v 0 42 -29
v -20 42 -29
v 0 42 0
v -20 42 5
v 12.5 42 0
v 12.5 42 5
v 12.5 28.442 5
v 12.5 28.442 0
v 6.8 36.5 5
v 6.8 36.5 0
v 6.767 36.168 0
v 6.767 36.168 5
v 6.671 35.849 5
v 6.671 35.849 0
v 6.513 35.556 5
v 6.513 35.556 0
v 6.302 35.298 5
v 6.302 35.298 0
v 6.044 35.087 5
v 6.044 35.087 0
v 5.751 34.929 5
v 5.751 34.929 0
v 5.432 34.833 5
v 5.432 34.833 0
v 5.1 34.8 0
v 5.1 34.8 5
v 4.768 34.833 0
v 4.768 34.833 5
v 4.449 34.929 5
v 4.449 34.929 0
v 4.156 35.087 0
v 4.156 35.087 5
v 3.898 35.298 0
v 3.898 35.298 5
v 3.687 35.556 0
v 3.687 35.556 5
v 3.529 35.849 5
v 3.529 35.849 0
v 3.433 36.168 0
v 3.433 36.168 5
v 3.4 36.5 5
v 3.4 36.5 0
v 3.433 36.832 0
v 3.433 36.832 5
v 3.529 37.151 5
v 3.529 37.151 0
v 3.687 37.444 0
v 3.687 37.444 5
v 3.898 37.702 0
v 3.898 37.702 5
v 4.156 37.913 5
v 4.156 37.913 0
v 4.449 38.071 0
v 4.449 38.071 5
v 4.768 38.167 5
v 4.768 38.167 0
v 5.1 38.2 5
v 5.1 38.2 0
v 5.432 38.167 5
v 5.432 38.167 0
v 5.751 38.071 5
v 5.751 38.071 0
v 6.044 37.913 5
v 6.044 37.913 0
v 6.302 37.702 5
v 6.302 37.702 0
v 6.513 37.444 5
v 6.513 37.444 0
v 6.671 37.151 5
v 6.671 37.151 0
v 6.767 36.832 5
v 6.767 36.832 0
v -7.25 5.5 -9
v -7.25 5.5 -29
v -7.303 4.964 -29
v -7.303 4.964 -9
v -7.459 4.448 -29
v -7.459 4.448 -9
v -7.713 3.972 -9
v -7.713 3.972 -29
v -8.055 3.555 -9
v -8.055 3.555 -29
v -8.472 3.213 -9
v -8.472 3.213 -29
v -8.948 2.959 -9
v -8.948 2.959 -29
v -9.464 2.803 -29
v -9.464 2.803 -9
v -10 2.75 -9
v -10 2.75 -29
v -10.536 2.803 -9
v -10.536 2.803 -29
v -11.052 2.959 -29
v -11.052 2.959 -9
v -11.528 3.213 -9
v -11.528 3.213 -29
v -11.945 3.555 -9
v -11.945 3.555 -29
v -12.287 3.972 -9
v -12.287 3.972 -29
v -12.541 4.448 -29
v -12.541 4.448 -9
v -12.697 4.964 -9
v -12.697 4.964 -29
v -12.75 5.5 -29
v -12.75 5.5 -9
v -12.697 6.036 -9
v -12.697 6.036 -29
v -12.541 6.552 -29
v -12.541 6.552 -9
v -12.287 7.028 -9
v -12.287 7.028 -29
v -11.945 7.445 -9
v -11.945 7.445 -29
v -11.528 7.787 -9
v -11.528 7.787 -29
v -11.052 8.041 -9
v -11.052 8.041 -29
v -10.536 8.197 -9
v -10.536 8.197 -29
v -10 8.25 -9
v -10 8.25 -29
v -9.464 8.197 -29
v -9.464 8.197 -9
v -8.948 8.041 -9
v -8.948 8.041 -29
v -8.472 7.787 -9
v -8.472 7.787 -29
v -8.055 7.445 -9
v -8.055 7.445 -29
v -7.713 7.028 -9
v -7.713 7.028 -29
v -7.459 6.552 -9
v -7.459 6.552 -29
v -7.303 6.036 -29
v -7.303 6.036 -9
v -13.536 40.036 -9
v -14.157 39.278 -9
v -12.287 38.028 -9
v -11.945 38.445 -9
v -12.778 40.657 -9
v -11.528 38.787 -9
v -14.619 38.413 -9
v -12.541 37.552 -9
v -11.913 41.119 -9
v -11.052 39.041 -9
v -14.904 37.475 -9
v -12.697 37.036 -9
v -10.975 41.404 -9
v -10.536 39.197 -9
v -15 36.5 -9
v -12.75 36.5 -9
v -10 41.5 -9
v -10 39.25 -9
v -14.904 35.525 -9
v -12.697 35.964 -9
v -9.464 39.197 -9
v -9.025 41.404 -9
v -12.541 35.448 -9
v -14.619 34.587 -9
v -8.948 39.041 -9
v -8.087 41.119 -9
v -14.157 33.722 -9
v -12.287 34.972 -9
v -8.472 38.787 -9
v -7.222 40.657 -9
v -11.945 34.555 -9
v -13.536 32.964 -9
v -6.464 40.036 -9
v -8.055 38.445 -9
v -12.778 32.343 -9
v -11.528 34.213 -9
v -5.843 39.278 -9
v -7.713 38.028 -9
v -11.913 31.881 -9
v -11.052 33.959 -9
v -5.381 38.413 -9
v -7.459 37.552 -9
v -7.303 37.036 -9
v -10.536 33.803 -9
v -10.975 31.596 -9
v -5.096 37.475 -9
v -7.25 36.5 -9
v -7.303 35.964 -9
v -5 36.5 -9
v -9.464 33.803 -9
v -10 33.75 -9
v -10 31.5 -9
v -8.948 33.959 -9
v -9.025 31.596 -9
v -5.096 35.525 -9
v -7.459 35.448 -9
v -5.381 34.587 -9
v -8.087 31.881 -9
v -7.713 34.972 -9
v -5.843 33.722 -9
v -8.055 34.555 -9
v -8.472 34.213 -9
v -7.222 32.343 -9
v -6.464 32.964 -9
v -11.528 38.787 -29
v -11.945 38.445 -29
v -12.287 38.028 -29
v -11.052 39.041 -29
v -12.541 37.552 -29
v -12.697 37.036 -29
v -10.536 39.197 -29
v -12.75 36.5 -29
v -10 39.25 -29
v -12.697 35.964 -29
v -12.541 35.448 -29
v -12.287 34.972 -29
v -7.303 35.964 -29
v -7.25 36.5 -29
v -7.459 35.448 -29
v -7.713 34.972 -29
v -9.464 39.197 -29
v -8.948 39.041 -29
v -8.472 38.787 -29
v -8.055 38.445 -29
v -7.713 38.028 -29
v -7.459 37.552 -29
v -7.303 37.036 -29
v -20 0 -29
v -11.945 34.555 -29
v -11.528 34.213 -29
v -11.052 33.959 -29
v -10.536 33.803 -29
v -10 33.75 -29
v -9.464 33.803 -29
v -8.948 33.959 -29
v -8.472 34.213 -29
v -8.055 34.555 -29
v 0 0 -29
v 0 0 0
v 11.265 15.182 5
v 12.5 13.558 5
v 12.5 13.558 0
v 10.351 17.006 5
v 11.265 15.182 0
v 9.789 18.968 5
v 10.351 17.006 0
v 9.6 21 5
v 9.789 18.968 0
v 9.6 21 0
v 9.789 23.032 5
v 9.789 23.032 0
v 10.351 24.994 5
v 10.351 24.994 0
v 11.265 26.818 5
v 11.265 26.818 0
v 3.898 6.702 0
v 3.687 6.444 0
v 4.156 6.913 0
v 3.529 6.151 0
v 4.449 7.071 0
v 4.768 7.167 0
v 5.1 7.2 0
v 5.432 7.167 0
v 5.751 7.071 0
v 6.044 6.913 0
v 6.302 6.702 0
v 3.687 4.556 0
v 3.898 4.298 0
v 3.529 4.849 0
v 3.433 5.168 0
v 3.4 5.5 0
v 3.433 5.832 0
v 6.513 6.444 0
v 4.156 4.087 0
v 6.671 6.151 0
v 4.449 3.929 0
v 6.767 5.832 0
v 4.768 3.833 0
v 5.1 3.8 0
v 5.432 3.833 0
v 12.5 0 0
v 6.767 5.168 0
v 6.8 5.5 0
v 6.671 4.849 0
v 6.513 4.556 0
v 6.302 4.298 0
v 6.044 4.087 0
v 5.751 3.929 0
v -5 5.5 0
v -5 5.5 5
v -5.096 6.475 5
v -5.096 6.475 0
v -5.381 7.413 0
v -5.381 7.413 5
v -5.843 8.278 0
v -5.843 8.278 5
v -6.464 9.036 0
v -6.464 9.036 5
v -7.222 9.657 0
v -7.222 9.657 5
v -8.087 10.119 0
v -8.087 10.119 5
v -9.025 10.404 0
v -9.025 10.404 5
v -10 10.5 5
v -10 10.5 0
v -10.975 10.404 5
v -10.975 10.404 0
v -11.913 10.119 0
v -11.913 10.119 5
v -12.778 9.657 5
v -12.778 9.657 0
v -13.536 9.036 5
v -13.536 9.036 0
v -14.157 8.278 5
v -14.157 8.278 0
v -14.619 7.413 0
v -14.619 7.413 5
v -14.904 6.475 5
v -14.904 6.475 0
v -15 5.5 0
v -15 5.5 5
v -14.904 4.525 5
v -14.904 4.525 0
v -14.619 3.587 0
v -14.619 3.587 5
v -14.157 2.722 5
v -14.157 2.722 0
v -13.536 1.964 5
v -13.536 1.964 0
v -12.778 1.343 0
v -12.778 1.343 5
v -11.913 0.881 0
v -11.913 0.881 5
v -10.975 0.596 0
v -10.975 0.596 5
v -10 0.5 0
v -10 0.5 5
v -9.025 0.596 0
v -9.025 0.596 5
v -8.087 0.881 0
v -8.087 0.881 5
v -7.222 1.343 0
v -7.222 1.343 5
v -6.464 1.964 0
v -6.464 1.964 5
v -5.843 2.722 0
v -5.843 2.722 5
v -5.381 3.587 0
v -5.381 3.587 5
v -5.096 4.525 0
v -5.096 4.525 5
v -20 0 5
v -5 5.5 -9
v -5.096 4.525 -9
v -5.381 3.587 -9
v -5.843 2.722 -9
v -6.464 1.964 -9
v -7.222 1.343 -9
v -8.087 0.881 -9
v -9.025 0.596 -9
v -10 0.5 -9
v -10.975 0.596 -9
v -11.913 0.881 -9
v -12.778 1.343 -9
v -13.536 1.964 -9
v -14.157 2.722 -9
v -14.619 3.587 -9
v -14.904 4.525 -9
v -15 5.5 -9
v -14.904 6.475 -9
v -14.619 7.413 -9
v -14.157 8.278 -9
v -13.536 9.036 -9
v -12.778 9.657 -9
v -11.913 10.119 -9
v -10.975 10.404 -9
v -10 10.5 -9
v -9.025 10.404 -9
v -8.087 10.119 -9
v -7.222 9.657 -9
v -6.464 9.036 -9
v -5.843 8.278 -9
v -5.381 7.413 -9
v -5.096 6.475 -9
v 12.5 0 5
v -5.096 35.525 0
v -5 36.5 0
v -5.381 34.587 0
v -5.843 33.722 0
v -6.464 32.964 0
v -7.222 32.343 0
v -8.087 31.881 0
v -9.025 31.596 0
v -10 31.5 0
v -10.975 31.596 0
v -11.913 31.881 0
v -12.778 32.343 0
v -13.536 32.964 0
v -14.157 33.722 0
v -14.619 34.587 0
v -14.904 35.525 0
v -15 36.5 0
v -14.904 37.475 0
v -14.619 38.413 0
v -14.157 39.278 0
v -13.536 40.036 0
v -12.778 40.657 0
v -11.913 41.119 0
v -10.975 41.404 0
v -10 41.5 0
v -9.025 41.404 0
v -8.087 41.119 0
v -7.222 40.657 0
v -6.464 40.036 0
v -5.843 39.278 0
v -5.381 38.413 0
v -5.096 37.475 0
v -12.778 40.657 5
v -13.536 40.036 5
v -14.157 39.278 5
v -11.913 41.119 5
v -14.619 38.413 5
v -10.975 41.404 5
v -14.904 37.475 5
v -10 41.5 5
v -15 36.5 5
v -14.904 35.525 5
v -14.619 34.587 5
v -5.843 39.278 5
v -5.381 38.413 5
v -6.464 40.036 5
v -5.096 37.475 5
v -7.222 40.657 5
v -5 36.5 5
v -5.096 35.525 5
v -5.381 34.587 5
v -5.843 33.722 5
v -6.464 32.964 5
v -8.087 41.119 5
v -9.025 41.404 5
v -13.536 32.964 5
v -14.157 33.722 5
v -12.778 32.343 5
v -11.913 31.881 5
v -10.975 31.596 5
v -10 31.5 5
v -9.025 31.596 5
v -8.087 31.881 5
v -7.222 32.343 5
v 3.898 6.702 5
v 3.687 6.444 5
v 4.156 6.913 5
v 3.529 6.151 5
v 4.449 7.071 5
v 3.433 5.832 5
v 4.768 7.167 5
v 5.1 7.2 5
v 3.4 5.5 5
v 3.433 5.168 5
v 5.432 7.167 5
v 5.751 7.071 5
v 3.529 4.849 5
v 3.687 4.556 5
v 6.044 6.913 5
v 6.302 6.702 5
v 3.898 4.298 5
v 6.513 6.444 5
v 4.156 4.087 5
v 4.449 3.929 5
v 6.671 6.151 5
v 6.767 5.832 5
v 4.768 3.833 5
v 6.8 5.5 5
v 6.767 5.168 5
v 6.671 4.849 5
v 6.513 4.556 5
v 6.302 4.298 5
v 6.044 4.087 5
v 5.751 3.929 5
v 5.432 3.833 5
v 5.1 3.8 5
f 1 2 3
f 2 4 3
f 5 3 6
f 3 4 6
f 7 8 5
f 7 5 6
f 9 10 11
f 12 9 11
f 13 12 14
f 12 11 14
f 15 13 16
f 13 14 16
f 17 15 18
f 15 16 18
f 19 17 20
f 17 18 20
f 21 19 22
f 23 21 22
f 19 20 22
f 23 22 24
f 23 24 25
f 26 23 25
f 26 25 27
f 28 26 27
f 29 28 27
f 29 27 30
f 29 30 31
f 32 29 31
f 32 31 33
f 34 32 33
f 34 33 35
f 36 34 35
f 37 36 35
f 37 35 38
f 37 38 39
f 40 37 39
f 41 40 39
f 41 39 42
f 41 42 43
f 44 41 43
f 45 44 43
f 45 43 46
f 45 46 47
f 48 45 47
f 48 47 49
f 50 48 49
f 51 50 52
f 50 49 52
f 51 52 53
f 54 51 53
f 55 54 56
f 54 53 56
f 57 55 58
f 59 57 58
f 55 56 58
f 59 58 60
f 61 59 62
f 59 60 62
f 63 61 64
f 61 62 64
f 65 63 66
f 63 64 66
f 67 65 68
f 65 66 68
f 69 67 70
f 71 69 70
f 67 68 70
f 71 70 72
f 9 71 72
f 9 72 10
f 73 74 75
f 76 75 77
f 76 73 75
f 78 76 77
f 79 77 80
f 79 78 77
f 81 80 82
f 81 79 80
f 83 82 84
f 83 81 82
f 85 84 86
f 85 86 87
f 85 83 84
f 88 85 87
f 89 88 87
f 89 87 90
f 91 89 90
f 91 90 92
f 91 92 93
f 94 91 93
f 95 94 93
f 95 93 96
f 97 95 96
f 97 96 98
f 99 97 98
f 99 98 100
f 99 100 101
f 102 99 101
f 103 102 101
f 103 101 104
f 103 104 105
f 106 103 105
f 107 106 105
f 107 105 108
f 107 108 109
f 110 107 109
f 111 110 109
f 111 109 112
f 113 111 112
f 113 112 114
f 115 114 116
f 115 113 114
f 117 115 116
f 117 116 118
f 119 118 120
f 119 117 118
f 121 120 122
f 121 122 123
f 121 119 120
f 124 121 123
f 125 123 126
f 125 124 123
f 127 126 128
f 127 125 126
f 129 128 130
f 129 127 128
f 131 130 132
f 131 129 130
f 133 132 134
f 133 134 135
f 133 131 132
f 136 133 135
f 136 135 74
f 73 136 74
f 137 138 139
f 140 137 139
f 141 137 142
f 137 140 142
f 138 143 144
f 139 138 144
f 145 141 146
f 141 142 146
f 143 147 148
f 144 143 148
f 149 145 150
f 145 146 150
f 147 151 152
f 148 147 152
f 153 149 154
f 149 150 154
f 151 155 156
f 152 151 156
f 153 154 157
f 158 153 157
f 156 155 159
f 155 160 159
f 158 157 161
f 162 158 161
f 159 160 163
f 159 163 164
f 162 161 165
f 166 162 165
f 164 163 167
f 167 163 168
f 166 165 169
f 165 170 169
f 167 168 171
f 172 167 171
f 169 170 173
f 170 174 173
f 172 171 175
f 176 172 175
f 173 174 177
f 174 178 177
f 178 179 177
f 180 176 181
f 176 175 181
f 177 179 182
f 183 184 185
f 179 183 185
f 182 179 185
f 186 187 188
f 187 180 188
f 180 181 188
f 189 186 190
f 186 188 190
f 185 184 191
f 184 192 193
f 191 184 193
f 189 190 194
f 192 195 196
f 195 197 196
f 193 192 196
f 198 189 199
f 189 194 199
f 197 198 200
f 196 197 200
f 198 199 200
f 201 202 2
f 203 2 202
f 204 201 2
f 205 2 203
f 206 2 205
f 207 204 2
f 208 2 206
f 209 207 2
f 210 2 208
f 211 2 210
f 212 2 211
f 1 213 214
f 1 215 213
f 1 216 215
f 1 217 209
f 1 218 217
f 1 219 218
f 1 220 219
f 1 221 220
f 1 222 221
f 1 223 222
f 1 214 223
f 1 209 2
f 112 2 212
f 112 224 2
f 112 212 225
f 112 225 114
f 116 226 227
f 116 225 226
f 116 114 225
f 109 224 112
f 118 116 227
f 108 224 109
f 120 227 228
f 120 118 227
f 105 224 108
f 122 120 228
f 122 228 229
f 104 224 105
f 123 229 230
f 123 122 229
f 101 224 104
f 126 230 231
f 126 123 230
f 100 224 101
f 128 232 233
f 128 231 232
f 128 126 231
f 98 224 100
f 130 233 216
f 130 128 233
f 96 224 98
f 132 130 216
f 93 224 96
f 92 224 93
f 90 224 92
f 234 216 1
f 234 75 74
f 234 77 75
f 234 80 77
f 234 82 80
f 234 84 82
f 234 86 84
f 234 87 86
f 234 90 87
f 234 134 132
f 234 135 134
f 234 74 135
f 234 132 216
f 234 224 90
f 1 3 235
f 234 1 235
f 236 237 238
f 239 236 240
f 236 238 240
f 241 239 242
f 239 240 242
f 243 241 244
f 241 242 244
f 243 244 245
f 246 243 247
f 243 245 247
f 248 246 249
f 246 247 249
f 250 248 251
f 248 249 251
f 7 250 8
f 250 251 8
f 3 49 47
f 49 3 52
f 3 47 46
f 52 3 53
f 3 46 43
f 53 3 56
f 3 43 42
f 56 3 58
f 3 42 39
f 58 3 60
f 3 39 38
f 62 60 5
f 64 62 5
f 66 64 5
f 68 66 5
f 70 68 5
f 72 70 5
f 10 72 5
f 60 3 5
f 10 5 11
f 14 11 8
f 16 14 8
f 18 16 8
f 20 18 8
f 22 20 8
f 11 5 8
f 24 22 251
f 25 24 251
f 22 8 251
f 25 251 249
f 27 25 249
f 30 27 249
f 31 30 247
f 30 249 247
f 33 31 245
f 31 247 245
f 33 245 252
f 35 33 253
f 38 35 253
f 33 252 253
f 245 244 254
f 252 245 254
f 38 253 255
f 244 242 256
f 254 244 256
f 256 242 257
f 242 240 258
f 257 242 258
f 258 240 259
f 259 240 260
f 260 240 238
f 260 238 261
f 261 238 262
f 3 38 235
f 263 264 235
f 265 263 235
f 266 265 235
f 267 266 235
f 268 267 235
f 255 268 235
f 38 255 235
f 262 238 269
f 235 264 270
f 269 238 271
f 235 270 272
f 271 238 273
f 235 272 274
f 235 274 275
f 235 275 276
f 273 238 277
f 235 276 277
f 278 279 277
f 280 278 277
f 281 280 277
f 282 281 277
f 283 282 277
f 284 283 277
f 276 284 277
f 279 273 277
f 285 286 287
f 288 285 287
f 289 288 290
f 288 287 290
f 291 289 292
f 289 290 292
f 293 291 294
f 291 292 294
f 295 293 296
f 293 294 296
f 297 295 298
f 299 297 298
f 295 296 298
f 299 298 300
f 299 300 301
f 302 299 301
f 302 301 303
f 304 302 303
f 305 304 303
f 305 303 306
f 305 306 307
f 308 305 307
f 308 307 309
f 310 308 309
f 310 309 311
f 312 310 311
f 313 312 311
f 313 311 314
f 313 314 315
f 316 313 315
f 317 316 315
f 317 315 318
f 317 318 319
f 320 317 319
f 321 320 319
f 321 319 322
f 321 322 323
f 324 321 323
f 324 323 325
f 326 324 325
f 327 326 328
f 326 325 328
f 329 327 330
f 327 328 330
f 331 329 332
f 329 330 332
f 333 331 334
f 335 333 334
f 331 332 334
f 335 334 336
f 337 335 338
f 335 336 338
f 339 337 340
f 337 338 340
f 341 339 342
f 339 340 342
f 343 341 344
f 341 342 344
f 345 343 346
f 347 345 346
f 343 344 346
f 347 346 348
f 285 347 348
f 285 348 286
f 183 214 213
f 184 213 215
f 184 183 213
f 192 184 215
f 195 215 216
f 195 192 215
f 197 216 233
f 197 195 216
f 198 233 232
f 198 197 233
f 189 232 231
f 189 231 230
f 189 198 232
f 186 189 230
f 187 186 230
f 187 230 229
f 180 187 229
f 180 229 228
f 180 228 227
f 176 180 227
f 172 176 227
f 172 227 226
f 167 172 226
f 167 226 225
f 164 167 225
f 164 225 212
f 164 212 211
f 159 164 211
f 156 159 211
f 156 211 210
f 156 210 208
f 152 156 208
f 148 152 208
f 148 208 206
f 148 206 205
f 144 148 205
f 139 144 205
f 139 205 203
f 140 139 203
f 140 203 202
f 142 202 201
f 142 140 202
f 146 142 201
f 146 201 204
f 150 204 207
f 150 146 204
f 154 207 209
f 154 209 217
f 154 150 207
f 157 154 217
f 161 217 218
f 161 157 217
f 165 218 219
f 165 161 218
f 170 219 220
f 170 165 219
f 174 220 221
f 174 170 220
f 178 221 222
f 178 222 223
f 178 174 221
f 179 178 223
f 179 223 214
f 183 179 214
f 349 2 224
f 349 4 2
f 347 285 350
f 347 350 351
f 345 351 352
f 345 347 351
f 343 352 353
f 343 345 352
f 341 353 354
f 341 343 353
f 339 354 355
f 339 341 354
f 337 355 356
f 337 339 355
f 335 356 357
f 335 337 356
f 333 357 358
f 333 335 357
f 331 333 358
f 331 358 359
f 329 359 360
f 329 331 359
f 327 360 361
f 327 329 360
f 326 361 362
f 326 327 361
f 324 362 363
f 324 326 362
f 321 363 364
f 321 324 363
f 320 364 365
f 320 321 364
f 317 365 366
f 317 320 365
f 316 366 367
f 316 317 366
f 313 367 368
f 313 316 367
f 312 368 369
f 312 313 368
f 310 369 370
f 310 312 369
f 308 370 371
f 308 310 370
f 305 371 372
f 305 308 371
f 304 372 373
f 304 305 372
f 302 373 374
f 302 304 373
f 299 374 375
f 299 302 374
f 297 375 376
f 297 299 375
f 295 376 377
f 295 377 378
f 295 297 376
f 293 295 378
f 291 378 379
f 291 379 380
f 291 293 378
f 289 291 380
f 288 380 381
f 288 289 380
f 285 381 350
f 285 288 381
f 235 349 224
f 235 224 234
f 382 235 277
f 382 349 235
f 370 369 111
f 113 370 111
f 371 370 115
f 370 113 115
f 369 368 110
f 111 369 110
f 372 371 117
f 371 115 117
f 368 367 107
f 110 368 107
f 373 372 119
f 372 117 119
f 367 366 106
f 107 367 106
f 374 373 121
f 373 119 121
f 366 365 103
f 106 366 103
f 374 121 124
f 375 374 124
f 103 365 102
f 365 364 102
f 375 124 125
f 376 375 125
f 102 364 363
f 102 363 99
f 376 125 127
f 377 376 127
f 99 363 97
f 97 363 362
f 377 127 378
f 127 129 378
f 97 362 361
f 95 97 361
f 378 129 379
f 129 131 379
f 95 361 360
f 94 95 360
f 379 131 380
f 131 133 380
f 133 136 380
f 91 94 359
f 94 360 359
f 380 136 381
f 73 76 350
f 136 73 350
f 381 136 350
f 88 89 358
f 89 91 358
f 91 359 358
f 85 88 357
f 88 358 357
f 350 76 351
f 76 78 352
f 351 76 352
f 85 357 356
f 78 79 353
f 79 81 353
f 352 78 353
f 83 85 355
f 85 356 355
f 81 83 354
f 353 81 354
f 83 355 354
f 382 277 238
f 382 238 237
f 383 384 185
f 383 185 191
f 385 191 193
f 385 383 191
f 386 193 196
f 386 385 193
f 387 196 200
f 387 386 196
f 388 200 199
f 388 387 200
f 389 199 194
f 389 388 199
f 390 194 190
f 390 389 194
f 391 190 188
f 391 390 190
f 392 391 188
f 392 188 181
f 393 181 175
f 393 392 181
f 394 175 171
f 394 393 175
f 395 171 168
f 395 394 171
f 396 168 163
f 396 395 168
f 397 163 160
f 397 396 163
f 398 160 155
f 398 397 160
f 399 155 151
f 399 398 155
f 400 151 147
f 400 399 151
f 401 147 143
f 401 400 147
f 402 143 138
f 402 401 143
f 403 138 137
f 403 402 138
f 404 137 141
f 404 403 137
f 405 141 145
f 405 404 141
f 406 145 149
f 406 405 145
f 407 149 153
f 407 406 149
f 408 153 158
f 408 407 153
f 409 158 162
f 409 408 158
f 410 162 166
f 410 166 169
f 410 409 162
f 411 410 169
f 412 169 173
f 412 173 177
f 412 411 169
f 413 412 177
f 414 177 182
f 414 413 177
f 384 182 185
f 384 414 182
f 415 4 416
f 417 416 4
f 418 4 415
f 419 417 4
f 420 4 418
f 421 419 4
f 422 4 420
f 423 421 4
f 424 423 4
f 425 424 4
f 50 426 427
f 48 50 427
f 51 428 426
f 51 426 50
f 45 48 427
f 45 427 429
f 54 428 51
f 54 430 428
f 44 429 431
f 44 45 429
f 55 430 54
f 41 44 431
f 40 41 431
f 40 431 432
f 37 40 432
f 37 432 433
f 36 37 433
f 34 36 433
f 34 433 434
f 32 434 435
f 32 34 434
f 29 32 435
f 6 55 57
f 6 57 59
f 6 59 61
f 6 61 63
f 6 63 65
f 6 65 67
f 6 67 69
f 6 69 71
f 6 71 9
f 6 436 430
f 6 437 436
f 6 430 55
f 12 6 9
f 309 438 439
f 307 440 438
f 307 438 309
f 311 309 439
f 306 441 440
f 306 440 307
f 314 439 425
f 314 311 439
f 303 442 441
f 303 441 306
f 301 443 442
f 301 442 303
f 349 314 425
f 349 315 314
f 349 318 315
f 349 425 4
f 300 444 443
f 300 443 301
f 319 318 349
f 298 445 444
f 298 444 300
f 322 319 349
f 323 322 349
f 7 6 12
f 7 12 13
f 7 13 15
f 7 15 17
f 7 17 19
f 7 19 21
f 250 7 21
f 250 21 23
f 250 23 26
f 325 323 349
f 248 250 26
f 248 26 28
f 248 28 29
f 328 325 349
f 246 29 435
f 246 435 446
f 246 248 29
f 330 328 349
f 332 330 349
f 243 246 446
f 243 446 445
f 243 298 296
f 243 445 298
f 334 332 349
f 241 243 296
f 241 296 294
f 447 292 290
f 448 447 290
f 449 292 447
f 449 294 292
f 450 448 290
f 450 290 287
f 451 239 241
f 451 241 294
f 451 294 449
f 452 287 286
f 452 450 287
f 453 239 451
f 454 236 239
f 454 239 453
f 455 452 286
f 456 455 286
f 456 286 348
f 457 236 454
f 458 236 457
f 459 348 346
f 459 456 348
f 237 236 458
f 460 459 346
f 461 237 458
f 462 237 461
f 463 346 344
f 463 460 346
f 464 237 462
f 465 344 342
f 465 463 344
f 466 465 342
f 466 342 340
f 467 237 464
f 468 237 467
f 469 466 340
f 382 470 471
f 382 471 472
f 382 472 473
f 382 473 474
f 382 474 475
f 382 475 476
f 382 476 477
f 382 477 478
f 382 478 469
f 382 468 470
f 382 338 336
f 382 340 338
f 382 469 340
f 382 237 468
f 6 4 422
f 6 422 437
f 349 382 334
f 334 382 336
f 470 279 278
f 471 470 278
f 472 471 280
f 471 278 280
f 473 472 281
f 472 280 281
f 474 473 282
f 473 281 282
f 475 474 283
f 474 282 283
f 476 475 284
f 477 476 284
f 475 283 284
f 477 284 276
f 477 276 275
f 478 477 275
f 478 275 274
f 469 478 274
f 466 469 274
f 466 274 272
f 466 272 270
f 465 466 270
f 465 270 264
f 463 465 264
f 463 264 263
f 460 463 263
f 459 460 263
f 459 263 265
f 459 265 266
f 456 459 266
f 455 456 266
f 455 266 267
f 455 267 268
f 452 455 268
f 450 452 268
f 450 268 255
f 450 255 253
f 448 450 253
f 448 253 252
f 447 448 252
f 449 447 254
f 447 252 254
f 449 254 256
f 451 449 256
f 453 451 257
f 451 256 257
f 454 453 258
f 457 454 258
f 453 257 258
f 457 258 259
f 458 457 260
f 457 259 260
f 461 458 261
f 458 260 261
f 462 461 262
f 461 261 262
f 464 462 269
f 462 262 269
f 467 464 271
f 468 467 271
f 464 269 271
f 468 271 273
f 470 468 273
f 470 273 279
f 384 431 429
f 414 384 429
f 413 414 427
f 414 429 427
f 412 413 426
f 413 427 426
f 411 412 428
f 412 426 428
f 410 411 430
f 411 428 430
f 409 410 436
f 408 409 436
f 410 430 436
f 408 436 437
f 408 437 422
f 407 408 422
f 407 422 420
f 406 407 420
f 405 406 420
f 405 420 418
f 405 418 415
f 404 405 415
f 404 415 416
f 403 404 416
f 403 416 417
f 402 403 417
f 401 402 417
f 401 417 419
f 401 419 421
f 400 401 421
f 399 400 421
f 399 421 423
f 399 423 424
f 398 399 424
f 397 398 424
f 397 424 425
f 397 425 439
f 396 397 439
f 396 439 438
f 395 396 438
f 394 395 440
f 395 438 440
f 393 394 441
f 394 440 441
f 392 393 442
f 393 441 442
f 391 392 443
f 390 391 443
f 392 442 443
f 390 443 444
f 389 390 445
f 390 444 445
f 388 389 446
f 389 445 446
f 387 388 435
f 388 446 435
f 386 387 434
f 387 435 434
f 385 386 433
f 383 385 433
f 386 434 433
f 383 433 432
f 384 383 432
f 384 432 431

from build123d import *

# Parameters (mm, degrees)
F1_DEPTH  = 42
F2_R      = 1.7
F2_R_2    = 11
F3_DEPTH  = 5.001
F4_W      = 42
F4_H      = 5
F5_DEPTH  = 20
F6_R      = 5
F6_R_2    = 2.75
F7_DEPTH  = 19
F8_W      = 20
F8_H      = 42
F8_R      = 5
F8_R_2    = 2.75
F9_DEPTH  = 29
F10_DEPTH = 9


with BuildPart() as f1:
    # F0 (on Front) → F1 (new body)
    with BuildSketch(Plane.XZ):
        Polygon((12.5, 5), (8.5, 5), (0, 5), (0, 0), (12.5, 0), align=None)
    extrude(amount=-F1_DEPTH)

    # F2 (on face) → F3 (cut, through all)
    with BuildSketch(Plane(origin=(0, 0, 0), x_dir=(1, 0, 0), z_dir=(0, 0, -1))):
        with Locations((5.1, -5.5)):
            Circle(F2_R)
        with Locations((5.1, -36.5)):
            Circle(F2_R)
        with Locations((20.6, -21)):
            Circle(F2_R_2)
    extrude(amount=-F3_DEPTH, mode=Mode.SUBTRACT)

    # F4 (on face) → F5 (join)
    with BuildSketch(Plane(origin=(0, 0, 0), x_dir=(0, -1, 0), z_dir=(-1, 0, 0))):
        with Locations((-21, 2.5)):
            Rectangle(F4_W, F4_H)
    extrude(amount=F5_DEPTH)

    # F6 (on face) → F7 (cut)
    with BuildSketch(Plane.XY.offset(5)):
        with Locations((-10, 36.5)):
            Circle(F6_R)
        with Locations((-10, 36.5)):
            Circle(F6_R_2, mode=Mode.SUBTRACT)
        with Locations((-10, 5.5)):
            Circle(F6_R)
        with Locations((-10, 5.5)):
            Circle(F6_R_2, mode=Mode.SUBTRACT)
        with Locations((-10, 5.5)):
            Circle(F6_R_2)
        with Locations((-10, 36.5)):
            Circle(F6_R_2)
    extrude(amount=-F7_DEPTH, mode=Mode.SUBTRACT)

    # F8 (on face) → F9 (join)
    with BuildSketch(Plane(origin=(0, 0, 0), x_dir=(1, 0, 0), z_dir=(0, 0, -1))):
        with Locations((-10, -21)):
            Rectangle(F8_W, F8_H)
        with Locations((-10, -36.5)):
            Circle(F8_R, mode=Mode.SUBTRACT)
        with Locations((-10, -5.5)):
            Circle(F8_R_2, mode=Mode.SUBTRACT)
        with Locations((-10, -36.5)):
            Circle(F8_R_2)
        with Locations((-10, -36.5)):
            Circle(F8_R)
        with Locations((-10, -36.5)):
            Circle(F8_R_2, mode=Mode.SUBTRACT)
    extrude(amount=F9_DEPTH)

    # F8 (on face) → F10 (cut)
    with BuildSketch(Plane(origin=(0, 0, 0), x_dir=(1, 0, 0), z_dir=(0, 0, -1))):
        with Locations((-10, -36.5)):
            Circle(F8_R)
        with Locations((-10, -36.5)):
            Circle(F8_R_2, mode=Mode.SUBTRACT)
        with Locations((-10, -5.5)):
            Circle(F8_R)
        with Locations((-10, -5.5)):
            Circle(F8_R_2, mode=Mode.SUBTRACT)
    extrude(amount=F10_DEPTH, mode=Mode.SUBTRACT)


solid = f1.part
